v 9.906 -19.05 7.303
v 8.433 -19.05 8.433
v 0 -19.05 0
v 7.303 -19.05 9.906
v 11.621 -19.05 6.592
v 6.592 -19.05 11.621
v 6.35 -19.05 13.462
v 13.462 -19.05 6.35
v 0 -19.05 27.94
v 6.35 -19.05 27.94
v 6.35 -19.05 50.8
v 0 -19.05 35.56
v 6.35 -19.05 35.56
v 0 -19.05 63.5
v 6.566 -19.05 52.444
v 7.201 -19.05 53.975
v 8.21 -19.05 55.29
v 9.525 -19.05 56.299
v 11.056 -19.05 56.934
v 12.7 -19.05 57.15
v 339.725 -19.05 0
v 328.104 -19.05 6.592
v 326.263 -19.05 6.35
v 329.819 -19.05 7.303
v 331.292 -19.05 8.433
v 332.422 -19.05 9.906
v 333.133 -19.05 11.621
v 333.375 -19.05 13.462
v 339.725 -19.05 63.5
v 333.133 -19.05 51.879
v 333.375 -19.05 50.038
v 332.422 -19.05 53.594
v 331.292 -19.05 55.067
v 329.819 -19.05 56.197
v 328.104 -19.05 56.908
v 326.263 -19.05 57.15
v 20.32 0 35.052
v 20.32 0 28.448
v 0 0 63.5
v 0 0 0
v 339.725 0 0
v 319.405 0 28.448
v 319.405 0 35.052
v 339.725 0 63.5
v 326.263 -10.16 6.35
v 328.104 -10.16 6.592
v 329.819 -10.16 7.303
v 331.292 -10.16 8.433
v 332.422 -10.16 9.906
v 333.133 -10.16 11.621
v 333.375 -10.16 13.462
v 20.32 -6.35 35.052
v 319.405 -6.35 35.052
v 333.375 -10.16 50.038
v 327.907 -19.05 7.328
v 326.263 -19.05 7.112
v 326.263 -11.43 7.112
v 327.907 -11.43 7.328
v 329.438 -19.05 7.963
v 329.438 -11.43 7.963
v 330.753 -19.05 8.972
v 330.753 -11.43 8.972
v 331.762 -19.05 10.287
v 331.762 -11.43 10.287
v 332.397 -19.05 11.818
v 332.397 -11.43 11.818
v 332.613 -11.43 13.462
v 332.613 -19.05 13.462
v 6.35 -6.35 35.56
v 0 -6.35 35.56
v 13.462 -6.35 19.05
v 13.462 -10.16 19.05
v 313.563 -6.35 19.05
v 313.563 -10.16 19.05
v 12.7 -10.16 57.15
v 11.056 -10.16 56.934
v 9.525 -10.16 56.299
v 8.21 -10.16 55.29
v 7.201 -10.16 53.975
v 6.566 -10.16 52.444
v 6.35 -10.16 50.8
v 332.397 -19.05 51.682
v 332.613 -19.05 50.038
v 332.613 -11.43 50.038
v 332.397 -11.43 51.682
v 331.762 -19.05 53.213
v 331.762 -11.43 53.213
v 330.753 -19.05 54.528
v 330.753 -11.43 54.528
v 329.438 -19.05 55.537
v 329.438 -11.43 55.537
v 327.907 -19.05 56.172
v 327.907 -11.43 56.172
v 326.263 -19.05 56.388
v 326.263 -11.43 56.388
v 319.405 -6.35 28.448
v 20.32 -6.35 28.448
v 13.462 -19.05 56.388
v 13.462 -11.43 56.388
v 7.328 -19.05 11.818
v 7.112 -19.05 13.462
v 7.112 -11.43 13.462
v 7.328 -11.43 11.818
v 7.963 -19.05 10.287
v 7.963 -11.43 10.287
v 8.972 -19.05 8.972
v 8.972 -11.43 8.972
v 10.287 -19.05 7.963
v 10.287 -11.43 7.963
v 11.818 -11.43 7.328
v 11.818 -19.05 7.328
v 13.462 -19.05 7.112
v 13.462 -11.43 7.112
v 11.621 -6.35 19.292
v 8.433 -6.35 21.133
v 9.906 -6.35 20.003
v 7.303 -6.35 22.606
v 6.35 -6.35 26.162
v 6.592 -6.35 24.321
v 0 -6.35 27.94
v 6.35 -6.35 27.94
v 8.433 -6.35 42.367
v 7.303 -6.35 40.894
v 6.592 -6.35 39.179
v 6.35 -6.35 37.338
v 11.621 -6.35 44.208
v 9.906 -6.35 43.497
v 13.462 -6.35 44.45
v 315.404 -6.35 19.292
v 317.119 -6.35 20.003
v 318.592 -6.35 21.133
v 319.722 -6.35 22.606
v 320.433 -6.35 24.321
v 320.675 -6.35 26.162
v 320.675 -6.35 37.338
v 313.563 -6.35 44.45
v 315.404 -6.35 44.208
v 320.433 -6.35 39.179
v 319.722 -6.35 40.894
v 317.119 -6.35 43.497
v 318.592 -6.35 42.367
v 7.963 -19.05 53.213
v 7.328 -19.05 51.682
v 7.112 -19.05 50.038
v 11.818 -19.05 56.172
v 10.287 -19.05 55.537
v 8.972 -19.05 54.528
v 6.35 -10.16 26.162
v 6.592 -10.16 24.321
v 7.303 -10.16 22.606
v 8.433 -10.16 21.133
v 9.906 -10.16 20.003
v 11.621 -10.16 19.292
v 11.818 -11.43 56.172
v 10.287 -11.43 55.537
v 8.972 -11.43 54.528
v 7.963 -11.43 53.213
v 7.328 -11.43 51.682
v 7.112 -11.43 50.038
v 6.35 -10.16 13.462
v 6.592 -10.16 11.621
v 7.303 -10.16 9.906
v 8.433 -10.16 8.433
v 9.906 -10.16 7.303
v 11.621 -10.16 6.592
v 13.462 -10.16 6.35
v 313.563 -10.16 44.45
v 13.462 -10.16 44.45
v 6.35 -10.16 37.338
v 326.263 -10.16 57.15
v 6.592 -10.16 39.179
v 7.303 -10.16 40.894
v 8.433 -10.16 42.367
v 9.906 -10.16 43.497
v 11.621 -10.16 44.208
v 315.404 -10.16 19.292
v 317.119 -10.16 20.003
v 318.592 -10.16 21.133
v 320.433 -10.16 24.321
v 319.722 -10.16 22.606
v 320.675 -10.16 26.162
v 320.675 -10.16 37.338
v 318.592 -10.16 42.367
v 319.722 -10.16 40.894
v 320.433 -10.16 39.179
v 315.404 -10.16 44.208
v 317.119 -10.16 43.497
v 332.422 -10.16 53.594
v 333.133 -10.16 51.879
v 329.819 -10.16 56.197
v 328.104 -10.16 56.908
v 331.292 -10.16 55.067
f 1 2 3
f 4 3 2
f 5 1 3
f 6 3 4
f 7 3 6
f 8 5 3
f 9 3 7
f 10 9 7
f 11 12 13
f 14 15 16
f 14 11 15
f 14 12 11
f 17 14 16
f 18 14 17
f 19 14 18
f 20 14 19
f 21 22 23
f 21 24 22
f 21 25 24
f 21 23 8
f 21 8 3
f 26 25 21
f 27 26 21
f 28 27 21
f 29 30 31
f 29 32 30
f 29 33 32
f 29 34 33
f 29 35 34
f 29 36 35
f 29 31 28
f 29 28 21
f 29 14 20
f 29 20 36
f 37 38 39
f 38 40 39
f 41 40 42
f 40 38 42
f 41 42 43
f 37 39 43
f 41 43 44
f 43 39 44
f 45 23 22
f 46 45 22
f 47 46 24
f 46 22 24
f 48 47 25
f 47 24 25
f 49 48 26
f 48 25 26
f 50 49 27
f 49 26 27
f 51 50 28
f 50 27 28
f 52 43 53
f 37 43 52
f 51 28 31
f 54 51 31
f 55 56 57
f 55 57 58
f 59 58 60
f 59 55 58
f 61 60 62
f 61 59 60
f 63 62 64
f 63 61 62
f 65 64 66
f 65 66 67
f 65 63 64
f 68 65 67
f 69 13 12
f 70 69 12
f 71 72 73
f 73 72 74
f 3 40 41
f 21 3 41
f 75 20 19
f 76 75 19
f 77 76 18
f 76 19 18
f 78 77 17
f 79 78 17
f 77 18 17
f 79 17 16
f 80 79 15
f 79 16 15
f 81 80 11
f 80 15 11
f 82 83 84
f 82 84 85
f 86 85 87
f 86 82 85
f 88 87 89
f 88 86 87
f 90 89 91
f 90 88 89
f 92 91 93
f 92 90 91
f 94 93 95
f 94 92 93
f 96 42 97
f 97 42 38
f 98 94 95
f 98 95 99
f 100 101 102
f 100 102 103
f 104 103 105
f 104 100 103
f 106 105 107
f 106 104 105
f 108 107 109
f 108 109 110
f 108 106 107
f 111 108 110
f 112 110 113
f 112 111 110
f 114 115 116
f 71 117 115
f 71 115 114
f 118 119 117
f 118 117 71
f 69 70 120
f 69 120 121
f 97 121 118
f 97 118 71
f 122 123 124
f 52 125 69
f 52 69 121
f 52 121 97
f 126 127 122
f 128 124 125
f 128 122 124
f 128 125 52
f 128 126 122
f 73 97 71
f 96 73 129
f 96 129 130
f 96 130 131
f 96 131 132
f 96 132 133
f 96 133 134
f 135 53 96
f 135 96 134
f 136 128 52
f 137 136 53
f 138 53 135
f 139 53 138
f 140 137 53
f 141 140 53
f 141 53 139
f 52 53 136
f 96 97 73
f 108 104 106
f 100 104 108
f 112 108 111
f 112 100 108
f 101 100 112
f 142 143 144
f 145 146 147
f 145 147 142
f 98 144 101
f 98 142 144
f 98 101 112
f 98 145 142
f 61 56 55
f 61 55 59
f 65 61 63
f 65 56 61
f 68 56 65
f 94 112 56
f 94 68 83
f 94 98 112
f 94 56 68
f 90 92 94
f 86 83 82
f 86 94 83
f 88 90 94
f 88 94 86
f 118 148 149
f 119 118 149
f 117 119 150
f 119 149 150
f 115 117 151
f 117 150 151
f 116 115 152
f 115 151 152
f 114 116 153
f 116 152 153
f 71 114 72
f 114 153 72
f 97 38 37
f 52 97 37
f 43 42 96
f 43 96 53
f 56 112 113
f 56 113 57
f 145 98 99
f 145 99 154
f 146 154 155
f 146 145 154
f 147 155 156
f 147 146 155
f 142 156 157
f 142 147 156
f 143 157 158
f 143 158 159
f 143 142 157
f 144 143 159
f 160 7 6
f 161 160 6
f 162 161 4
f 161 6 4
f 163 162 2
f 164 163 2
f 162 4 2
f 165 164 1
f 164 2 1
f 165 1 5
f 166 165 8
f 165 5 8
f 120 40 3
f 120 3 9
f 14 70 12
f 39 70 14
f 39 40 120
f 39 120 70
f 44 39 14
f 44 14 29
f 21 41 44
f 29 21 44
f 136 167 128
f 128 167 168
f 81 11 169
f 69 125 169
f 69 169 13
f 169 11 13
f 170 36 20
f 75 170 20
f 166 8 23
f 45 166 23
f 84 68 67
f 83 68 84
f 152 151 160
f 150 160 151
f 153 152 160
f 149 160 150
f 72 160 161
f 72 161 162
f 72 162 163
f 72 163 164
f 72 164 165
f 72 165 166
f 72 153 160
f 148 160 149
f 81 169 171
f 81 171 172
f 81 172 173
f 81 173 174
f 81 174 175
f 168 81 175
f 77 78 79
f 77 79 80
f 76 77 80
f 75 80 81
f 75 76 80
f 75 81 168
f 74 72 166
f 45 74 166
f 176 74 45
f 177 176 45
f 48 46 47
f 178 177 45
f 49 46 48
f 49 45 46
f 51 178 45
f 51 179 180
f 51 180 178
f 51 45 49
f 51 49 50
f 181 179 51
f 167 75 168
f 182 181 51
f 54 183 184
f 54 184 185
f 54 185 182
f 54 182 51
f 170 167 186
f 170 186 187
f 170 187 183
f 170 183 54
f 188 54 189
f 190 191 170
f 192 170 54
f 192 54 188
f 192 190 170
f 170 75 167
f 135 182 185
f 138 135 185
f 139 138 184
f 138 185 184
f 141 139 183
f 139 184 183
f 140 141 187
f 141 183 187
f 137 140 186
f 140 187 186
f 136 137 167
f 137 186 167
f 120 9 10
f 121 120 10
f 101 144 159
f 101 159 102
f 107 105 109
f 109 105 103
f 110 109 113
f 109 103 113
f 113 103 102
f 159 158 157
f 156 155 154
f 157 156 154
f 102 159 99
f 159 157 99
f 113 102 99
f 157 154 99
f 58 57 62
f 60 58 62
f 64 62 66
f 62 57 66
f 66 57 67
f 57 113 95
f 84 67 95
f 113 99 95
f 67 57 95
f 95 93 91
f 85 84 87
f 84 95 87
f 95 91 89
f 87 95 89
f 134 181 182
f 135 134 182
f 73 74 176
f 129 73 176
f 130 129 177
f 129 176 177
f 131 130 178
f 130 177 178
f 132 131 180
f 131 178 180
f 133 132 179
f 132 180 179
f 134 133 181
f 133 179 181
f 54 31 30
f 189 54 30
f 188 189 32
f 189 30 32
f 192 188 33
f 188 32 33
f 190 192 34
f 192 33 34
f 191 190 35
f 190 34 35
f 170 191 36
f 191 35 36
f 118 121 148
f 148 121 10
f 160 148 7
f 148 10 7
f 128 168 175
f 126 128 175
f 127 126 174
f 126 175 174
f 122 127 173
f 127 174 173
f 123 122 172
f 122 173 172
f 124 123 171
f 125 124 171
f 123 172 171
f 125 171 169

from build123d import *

# Parameters (mm, degrees)
F0_W     = 339.725
F0_H     = 63.5
F1_DEPTH = 19.05
F3_DEPTH = 12.7
F5_DEPTH = 8.89
F7_DEPTH = 7.62
F8_W     = 299.085
F8_H     = 6.604
F9_DEPTH = 25.4


with BuildPart() as f1:
    # F0 (on Front) → F1 (new body)
    with BuildSketch(Plane.XZ):
        with Locations((169.8625, 31.75)):
            Rectangle(F0_W, F0_H)
    extrude(amount=F1_DEPTH)

    # F2 (on face) → F3 (cut)
    with BuildSketch(Plane.XZ.offset(19.05)):
        with BuildLine():
            Line((313.563, 44.45), (13.462, 44.45))
            ThreePointArc((13.462, 44.45), (8.4330565722, 42.3669434278), (6.35, 37.338))
            Line((6.35, 37.338), (6.35, 35.56))
            Line((6.35, 35.56), (0, 35.56))
            Line((0, 35.56), (0, 27.94))
            Line((0, 27.94), (6.35, 27.94))
            Line((6.35, 27.94), (6.35, 26.162))
            ThreePointArc((6.35, 26.162), (8.4330565722, 21.1330565722), (13.462, 19.05))
            Line((13.462, 19.05), (313.563, 19.05))
            ThreePointArc((313.563, 19.05), (318.5919434278, 21.1330565722), (320.675, 26.162))
            Line((320.675, 26.162), (320.675, 37.338))
            ThreePointArc((320.675, 37.338), (318.5919434278, 42.3669434278), (313.563, 44.45))
        make_face()
    extrude(amount=-F3_DEPTH, mode=Mode.SUBTRACT)

    # F4 (on face) → F5 (cut)
    with BuildSketch(Plane.XZ.offset(19.05)):
        with BuildLine():
            Line((326.263, 57.15), (12.7, 57.15))
            ThreePointArc((12.7, 57.15), (8.2098719395, 55.2901280605), (6.35, 50.8))
            Line((6.35, 50.8), (6.35, 37.338))
            ThreePointArc((6.35, 37.338), (8.4330565722, 42.3669434278), (13.462, 44.45))
            Line((13.462, 44.45), (313.563, 44.45))
            ThreePointArc((313.563, 44.45), (318.5919434278, 42.3669434278), (320.675, 37.338))
            Line((320.675, 37.338), (320.675, 26.162))
            ThreePointArc((320.675, 26.162), (318.5919434278, 21.1330565722), (313.563, 19.05))
            Line((313.563, 19.05), (13.462, 19.05))
            ThreePointArc((13.462, 19.05), (8.4330565722, 21.1330565722), (6.35, 26.162))
            Line((6.35, 26.162), (6.35, 13.462))
            ThreePointArc((6.35, 13.462), (8.4330565722, 8.4330565722), (13.462, 6.35))
            Line((13.462, 6.35), (326.263, 6.35))
            ThreePointArc((326.263, 6.35), (331.2919434278, 8.4330565722), (333.375, 13.462))
            Line((333.375, 13.462), (333.375, 50.038))
            ThreePointArc((333.375, 50.038), (331.2919434278, 55.0669434278), (326.263, 57.15))
        make_face()
    extrude(amount=-F5_DEPTH, mode=Mode.SUBTRACT)

    # F8 (on face) → F9 (cut)
    with BuildSketch(Plane(origin=(0, 0, 0), x_dir=(-1, 0, 0), z_dir=(0, 1, 0))):
        with Locations((-169.8625, 31.75)):
            Rectangle(F8_W, F8_H)
    extrude(amount=-F9_DEPTH, mode=Mode.SUBTRACT)


with BuildPart() as f7:
    # F6 (on face) → F7 (new body)
    with BuildSketch(Plane.XZ.offset(19.05)):
        with BuildLine():
            Line((326.263, 56.388), (13.462, 56.388))
            ThreePointArc((13.462, 56.388), (8.9718719395, 54.5281280605), (7.112, 50.038))
            Line((7.112, 50.038), (7.112, 13.462))
            ThreePointArc((7.112, 13.462), (8.9718719395, 8.9718719395), (13.462, 7.112))
            Line((13.462, 7.112), (326.263, 7.112))
            ThreePointArc((326.263, 7.112), (330.7531280605, 8.9718719395), (332.613, 13.462))
            Line((332.613, 13.462), (332.613, 50.038))
            ThreePointArc((332.613, 50.038), (330.7531280605, 54.5281280605), (326.263, 56.388))
        make_face()
    extrude(amount=-F7_DEPTH)


solid = Compound([f1.part, f7.part])
